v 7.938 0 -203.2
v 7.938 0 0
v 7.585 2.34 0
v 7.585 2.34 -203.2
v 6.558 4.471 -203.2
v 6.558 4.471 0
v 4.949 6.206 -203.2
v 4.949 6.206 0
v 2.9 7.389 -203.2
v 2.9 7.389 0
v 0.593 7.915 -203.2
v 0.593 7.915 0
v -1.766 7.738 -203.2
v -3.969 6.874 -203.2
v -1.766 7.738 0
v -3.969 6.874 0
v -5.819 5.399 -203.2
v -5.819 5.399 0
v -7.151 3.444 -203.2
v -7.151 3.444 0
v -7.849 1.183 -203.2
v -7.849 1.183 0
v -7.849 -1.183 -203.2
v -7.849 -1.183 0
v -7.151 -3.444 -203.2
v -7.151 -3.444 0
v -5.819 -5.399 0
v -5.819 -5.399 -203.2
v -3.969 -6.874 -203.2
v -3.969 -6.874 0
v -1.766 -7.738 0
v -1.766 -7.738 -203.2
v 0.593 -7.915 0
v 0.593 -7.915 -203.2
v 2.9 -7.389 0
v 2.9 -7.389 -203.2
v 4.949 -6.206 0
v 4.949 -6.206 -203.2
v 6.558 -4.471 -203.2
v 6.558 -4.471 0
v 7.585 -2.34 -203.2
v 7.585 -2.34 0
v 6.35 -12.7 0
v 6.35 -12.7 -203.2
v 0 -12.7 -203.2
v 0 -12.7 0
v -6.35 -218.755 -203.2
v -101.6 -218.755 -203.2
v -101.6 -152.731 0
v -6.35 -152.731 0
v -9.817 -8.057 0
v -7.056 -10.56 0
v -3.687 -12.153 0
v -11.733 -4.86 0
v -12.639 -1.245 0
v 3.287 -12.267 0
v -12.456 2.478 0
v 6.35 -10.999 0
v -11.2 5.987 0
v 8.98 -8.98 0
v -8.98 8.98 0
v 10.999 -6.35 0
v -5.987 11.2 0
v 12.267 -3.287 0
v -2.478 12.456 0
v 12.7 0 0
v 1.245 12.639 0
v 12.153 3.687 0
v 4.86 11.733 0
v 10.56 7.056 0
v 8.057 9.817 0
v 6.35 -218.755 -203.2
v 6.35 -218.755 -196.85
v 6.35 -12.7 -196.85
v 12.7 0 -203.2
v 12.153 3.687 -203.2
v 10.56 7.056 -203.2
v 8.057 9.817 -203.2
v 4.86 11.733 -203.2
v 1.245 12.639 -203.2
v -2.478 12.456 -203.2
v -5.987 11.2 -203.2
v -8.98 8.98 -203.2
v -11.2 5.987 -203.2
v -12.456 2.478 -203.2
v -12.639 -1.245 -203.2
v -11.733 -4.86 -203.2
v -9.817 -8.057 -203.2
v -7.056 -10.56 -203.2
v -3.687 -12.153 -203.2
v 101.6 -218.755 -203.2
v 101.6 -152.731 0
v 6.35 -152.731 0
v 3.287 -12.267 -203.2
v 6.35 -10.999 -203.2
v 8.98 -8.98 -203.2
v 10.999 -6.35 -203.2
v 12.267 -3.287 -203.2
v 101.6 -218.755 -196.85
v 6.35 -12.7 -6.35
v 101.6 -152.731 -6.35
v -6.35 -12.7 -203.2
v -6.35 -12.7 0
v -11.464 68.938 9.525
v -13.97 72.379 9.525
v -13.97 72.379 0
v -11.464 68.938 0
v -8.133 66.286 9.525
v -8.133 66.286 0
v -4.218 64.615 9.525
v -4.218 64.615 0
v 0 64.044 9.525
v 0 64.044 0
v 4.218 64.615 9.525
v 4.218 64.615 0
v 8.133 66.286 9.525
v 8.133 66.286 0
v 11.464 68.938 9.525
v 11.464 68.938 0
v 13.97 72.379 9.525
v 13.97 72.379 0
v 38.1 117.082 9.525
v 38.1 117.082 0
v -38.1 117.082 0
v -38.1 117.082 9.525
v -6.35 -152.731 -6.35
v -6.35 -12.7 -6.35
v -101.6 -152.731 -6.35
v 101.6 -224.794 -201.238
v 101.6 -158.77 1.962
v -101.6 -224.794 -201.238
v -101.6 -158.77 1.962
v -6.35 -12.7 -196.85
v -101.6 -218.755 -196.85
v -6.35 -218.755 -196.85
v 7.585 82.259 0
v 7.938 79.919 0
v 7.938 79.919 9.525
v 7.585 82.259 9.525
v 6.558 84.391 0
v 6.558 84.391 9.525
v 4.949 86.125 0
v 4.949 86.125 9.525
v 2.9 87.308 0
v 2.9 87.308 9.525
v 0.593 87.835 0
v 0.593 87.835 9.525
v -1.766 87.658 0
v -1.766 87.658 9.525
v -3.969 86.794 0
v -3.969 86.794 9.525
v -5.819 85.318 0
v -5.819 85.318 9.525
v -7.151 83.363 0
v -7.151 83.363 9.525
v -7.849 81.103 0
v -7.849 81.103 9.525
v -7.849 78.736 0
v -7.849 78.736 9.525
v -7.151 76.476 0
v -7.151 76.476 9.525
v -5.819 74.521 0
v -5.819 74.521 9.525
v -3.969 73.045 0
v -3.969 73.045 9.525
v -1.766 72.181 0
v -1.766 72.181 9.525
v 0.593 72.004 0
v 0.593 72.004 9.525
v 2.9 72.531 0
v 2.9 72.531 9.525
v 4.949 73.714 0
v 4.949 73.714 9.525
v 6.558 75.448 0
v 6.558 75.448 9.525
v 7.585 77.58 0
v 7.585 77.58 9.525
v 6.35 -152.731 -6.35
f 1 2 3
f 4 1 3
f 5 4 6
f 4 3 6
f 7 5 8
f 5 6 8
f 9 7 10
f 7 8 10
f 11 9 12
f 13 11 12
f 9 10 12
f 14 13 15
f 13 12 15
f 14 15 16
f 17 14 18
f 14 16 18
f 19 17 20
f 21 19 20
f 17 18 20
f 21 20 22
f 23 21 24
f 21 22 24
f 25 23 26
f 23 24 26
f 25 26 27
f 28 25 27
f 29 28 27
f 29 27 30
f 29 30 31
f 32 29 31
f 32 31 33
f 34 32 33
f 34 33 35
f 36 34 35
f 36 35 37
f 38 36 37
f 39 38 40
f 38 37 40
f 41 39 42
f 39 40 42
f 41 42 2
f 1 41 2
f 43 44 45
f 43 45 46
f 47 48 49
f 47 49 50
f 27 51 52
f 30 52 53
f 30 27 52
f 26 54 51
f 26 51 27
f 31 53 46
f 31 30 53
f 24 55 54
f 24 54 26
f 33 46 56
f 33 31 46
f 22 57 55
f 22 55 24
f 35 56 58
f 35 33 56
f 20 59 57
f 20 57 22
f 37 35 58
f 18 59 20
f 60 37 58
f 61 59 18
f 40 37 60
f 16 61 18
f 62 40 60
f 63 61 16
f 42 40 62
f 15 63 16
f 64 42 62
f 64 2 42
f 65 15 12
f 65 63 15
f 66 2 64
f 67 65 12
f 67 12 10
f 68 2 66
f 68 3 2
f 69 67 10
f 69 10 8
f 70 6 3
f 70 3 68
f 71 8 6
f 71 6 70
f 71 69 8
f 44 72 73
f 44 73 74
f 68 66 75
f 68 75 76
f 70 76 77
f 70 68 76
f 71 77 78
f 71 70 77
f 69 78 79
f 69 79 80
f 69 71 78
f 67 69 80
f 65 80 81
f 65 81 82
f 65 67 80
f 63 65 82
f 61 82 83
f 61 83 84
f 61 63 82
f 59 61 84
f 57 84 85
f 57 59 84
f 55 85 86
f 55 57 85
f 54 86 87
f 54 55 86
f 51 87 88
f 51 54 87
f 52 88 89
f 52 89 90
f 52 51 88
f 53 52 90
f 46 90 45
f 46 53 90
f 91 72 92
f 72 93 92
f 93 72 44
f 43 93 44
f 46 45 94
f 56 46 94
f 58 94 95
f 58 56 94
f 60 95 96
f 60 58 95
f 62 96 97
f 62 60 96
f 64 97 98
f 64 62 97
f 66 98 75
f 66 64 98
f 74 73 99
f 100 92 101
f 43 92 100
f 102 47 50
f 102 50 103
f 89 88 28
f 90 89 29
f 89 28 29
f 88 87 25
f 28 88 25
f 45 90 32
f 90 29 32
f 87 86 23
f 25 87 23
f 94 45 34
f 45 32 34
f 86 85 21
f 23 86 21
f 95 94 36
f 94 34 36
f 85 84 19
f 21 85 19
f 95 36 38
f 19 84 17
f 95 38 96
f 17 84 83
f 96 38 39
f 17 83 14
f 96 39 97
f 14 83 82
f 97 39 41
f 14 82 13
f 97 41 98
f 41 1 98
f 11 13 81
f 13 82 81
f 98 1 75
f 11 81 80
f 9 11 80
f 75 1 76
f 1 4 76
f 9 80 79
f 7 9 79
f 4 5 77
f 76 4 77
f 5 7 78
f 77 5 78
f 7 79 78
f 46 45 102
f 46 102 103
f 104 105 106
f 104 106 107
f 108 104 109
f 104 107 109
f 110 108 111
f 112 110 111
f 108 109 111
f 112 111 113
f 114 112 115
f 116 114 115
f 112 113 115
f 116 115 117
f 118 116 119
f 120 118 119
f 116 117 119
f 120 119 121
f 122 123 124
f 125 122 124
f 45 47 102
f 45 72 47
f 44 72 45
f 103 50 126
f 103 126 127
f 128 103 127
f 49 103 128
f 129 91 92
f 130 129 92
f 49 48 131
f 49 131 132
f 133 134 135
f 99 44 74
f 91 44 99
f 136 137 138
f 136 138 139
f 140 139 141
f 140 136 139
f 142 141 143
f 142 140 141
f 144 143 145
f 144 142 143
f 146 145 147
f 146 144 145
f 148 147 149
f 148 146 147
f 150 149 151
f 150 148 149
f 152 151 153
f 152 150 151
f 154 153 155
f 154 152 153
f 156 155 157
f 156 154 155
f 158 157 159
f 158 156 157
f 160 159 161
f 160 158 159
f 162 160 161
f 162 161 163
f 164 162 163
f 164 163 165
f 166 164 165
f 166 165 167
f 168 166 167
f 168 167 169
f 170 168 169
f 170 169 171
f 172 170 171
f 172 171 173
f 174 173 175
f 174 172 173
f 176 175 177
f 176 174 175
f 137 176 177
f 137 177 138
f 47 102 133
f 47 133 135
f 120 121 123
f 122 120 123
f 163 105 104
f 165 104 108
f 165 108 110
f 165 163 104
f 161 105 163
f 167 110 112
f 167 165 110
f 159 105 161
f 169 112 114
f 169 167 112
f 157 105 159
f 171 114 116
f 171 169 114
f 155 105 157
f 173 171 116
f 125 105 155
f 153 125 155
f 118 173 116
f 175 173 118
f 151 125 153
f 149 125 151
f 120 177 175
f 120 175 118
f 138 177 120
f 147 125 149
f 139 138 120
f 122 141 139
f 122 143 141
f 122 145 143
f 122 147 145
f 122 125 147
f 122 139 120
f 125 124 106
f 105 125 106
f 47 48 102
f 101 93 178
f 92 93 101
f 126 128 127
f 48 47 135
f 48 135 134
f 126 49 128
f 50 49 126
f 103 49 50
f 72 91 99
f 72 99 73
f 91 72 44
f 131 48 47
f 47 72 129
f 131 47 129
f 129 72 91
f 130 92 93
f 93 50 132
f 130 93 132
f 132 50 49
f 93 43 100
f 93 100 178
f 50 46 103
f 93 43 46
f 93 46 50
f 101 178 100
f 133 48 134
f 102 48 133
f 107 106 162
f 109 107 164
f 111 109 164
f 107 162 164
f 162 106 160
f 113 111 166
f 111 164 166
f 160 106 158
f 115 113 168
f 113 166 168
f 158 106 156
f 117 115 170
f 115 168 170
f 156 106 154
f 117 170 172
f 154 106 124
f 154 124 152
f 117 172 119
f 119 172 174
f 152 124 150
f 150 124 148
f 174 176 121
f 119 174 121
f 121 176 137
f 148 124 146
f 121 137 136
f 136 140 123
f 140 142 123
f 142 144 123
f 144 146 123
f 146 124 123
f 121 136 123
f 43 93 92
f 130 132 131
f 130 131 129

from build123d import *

# Parameters (mm, degrees)
F0_R      = 12.7
F0_R_2    = 7.9375
F1_DEPTH  = 203.2
F2_R      = 7.9375
F3_DEPTH  = 9.525
F5_DEPTH  = 6.35
F6_W      = 12.7
F6_H      = 213.6571239652
F6_W_2    = 95.25
F7_DEPTH  = 6.35
F11_DEPTH = 6.35
F12_DEPTH = 6.35


with BuildPart() as f1:
    # F0 (on Top) → F1 (new body)
    with BuildSketch(Plane.XY):
        Circle(F0_R)
        Circle(F0_R_2, mode=Mode.SUBTRACT)
    extrude(amount=-F1_DEPTH)

    # F4 (on Right) → F5 (join, symmetric)
    with BuildSketch(Plane.YZ):
        Polygon((-12.7, -203.2), (-12.7, 0), (-14.6078318357, 0), (-152.730970598, 0), (-218.7546528725, -203.2), align=None)
    extrude(amount=F5_DEPTH, both=True)

    # F6 (on face) → F7 (join)
    with BuildSketch(Plane(origin=(0, -138.1464606896, 44.8865060429), x_dir=(1, 0, 0), z_dir=(0, -0.9510565163, 0.3090169944))):
        with Locations((0, -154.0250274648)):
            Rectangle(F6_W, F6_H)
        with Locations((53.975, -154.0250274648)):
            Rectangle(F6_W_2, F6_H)
        with Locations((-53.975, -154.0250274648)):
            Rectangle(F6_W_2, F6_H)
    extrude(amount=F7_DEPTH)


with BuildPart() as f3:
    # F2 (on Top) → F3 (new body)
    with BuildSketch(Plane.XY):
        with BuildLine():
            ThreePointArc((13.9697287449, 72.3787812213), (15.3913136026, 76.0306491831), (15.875, 79.9194909885))
            ThreePointArc((15.875, 79.9194909885), (-3.8888418054, 95.3108045911), (-13.9697287449, 72.3787812213))
            ThreePointArc((-13.9697287449, 72.3787812213), (0, 64.0444909885), (13.9697287449, 72.3787812213))
        make_face()
        with Locations((0, 79.9194909885)):
            Circle(F2_R, mode=Mode.SUBTRACT)
        with BuildLine():
            ThreePointArc((-13.9697287449, 72.3787812213), (-3.8888418054, 95.3108045911), (15.875, 79.9194909885))
            ThreePointArc((15.875, 79.9194909885), (15.3913136026, 76.0306491831), (13.9697287449, 72.3787812213))
            Line((13.9697287449, 72.3787812213), (38.1, 117.081913205))
            Line((38.1, 117.081913205), (-38.1, 117.081913205))
            Line((-38.1, 117.081913205), (-13.9697287449, 72.3787812213))
        make_face()
    extrude(amount=F3_DEPTH)


with BuildPart() as f11:
    # F10 (on Top) → F11 (new body)
    with BuildSketch(Plane.XY):
        Polygon((-6.35, -152.730970598), (-6.35, -12.7), (-101.6, -152.730970598), align=None)
    extrude(amount=-F11_DEPTH)


with BuildPart() as f11b:
    # F10 (on Top) → F11, piece 2 (new body)
    with BuildSketch(Plane.XY):
        Polygon((101.6, -152.730970598), (6.35, -12.7), (6.35, -152.730970598), align=None)
    extrude(amount=-F11_DEPTH)


with BuildPart() as f12:
    # F9 (on offset) → F12 (new body)
    with BuildSketch(Plane(origin=(0, 0, -203.2), x_dir=(1, 0, 0), z_dir=(0, 0, -1))):
        Polygon((-6.35, 12.7), (-6.35, 218.7546528725), (-101.6, 218.7546528725), align=None)
    extrude(amount=-F12_DEPTH)


with BuildPart() as f12b:
    # F9 (on offset) → F12, piece 2 (new body)
    with BuildSketch(Plane(origin=(0, 0, -203.2), x_dir=(1, 0, 0), z_dir=(0, 0, -1))):
        Polygon((6.35, 12.7), (101.6, 218.7546528725), (6.35, 218.7546528725), align=None)
    extrude(amount=-F12_DEPTH)


solid = Compound([f1.part, f3.part, f11.part, f11b.part, f12.part, f12b.part])
